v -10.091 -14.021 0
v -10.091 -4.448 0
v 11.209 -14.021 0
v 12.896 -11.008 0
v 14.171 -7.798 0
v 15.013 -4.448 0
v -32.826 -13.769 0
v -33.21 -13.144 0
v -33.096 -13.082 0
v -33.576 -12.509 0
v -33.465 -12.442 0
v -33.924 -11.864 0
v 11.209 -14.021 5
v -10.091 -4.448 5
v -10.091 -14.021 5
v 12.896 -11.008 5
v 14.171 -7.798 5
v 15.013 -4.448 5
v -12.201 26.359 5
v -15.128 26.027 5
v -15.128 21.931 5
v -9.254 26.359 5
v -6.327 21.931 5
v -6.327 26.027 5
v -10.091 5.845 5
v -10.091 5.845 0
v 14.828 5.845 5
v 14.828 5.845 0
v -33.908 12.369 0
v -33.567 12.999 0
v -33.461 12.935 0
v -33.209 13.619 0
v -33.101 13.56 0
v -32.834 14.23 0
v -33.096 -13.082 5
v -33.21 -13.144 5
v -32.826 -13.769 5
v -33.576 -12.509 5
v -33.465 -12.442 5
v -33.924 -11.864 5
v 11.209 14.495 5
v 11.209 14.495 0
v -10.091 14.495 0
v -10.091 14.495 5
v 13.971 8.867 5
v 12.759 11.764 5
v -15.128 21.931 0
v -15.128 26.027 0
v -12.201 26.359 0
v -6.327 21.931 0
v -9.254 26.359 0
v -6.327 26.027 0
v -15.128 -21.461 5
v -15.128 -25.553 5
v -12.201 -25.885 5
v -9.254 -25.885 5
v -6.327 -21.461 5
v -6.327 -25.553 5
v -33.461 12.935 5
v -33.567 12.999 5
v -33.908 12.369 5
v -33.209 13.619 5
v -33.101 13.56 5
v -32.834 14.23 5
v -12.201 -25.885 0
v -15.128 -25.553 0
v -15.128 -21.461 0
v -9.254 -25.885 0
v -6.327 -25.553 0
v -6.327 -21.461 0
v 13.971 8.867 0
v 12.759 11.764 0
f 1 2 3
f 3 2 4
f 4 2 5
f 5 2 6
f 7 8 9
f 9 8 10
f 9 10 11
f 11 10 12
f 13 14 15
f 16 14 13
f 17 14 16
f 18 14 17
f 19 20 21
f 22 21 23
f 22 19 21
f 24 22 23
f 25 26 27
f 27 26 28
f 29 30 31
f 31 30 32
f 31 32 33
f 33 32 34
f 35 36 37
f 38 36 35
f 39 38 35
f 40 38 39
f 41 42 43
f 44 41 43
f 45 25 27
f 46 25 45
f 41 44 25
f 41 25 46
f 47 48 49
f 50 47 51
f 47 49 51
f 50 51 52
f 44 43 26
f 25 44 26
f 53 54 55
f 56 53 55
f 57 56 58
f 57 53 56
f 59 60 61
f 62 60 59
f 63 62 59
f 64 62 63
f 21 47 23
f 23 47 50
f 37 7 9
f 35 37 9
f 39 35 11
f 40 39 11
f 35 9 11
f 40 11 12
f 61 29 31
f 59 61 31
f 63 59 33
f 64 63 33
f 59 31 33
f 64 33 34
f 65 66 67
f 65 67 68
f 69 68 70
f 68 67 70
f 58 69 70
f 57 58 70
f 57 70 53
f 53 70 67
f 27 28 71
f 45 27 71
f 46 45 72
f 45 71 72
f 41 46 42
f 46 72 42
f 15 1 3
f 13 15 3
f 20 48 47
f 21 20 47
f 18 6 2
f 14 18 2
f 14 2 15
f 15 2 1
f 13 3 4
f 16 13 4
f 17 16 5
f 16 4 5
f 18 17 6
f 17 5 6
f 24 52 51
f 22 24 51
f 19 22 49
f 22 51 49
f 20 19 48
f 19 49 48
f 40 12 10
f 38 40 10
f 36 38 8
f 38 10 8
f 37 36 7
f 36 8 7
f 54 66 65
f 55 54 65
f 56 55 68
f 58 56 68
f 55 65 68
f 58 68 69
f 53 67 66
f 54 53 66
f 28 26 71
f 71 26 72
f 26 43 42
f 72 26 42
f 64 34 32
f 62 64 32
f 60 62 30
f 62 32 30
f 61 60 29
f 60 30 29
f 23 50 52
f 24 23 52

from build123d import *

# Parameters (mm, degrees)
F1_DEPTH = 5


# Not quite as in the source:
# - a feature names something its author has since deleted; it is built from what else it names


with BuildPart() as f1:
    # F0 (on Top) → F1 (new body)
    with BuildSketch(Plane.XY):
        with BuildLine():
            Line((-10.0905321275, 5.8453546624), (14.8275429309, 5.8453546624))
            ThreePointArc((14.8275429309, 5.8453546624), (13.4089467522, 10.333836128), (11.2090090081, 14.4954650047))
            Line((11.2090090081, 14.4954650047), (-10.0905321275, 14.4954650047))
            Line((-10.0905321275, 14.4954650047), (-10.0905321275, 5.8453546624))
        make_face()
    extrude(amount=F1_DEPTH)


with BuildPart() as f1b:
    # F0 (on Top) → F1, piece 2 (new body)
    with BuildSketch(Plane.XY):
        with BuildLine():
            Line((-10.0905321275, -14.0213307756), (11.2090090081, -14.0213307756))
            ThreePointArc((11.2090090081, -14.0213307756), (13.5867060203, -9.4237936022), (15.0127789753, -4.4481421807))
            Line((15.0127789753, -4.4481421807), (-10.0905321275, -4.4481421807))
            Line((-10.0905321275, -4.4481421807), (-10.0905321275, -14.0213307756))
        make_face()
    extrude(amount=F1_DEPTH)


with BuildPart() as f1c:
    # F0 (on Top) → F1, piece 3 (new body)
    with BuildSketch(Plane.XY):
        with BuildLine():
            Line((-15.1280330338, -21.4612806617), (-15.1280330338, -25.5532806617))
            ThreePointArc((-15.1280330338, -25.5532806617), (-10.7273935254, -25.9260303035), (-6.326754017, -25.5532806617))
            Line((-6.326754017, -25.5532806617), (-6.326754017, -21.4612806617))
            Line((-6.326754017, -21.4612806617), (-15.1280330338, -21.4612806617))
        make_face()
    extrude(amount=F1_DEPTH)


with BuildPart() as f1d:
    # F0 (on Top) → F1, piece 4 (new body)
    with BuildSketch(Plane.XY):
        with BuildLine():
            ThreePointArc((-32.8259622054, -13.7686791634), (-33.2689093484, -12.7551765215), (-33.9238437811, -11.8638569014))
            ThreePointArc((-33.9238437811, -11.8638569014), (-33.3949203437, -12.8278054239), (-32.8259622054, -13.7686791634))
        make_face()
    extrude(amount=F1_DEPTH)


with BuildPart() as f1e:
    # F0 (on Top) → F1, piece 5 (new body)
    with BuildSketch(Plane.XY):
        with BuildLine():
            ThreePointArc((-33.907864258, 12.3685733327), (-33.2698270825, 13.2408768133), (-32.8341372879, 14.2299062378))
            ThreePointArc((-32.8341372879, 14.2299062378), (-33.3901181901, 13.3102678428), (-33.907864258, 12.3685733327))
        make_face()
    extrude(amount=F1_DEPTH)


with BuildPart() as f1f:
    # F0 (on Top) → F1, piece 6 (new body)
    with BuildSketch(Plane.XY):
        with BuildLine():
            Line((-6.326754017, 21.931238229), (-6.326754017, 26.0274148909))
            ThreePointArc((-6.326754017, 26.0274148909), (-10.7273935254, 26.4001645326), (-15.1280330338, 26.0274148909))
            Line((-15.1280330338, 26.0274148909), (-15.1280330338, 21.931238229))
            Line((-15.1280330338, 21.931238229), (-6.326754017, 21.931238229))
        make_face()
    extrude(amount=F1_DEPTH)


solid = Compound([f1.part, f1b.part, f1c.part, f1d.part, f1e.part, f1f.part])
